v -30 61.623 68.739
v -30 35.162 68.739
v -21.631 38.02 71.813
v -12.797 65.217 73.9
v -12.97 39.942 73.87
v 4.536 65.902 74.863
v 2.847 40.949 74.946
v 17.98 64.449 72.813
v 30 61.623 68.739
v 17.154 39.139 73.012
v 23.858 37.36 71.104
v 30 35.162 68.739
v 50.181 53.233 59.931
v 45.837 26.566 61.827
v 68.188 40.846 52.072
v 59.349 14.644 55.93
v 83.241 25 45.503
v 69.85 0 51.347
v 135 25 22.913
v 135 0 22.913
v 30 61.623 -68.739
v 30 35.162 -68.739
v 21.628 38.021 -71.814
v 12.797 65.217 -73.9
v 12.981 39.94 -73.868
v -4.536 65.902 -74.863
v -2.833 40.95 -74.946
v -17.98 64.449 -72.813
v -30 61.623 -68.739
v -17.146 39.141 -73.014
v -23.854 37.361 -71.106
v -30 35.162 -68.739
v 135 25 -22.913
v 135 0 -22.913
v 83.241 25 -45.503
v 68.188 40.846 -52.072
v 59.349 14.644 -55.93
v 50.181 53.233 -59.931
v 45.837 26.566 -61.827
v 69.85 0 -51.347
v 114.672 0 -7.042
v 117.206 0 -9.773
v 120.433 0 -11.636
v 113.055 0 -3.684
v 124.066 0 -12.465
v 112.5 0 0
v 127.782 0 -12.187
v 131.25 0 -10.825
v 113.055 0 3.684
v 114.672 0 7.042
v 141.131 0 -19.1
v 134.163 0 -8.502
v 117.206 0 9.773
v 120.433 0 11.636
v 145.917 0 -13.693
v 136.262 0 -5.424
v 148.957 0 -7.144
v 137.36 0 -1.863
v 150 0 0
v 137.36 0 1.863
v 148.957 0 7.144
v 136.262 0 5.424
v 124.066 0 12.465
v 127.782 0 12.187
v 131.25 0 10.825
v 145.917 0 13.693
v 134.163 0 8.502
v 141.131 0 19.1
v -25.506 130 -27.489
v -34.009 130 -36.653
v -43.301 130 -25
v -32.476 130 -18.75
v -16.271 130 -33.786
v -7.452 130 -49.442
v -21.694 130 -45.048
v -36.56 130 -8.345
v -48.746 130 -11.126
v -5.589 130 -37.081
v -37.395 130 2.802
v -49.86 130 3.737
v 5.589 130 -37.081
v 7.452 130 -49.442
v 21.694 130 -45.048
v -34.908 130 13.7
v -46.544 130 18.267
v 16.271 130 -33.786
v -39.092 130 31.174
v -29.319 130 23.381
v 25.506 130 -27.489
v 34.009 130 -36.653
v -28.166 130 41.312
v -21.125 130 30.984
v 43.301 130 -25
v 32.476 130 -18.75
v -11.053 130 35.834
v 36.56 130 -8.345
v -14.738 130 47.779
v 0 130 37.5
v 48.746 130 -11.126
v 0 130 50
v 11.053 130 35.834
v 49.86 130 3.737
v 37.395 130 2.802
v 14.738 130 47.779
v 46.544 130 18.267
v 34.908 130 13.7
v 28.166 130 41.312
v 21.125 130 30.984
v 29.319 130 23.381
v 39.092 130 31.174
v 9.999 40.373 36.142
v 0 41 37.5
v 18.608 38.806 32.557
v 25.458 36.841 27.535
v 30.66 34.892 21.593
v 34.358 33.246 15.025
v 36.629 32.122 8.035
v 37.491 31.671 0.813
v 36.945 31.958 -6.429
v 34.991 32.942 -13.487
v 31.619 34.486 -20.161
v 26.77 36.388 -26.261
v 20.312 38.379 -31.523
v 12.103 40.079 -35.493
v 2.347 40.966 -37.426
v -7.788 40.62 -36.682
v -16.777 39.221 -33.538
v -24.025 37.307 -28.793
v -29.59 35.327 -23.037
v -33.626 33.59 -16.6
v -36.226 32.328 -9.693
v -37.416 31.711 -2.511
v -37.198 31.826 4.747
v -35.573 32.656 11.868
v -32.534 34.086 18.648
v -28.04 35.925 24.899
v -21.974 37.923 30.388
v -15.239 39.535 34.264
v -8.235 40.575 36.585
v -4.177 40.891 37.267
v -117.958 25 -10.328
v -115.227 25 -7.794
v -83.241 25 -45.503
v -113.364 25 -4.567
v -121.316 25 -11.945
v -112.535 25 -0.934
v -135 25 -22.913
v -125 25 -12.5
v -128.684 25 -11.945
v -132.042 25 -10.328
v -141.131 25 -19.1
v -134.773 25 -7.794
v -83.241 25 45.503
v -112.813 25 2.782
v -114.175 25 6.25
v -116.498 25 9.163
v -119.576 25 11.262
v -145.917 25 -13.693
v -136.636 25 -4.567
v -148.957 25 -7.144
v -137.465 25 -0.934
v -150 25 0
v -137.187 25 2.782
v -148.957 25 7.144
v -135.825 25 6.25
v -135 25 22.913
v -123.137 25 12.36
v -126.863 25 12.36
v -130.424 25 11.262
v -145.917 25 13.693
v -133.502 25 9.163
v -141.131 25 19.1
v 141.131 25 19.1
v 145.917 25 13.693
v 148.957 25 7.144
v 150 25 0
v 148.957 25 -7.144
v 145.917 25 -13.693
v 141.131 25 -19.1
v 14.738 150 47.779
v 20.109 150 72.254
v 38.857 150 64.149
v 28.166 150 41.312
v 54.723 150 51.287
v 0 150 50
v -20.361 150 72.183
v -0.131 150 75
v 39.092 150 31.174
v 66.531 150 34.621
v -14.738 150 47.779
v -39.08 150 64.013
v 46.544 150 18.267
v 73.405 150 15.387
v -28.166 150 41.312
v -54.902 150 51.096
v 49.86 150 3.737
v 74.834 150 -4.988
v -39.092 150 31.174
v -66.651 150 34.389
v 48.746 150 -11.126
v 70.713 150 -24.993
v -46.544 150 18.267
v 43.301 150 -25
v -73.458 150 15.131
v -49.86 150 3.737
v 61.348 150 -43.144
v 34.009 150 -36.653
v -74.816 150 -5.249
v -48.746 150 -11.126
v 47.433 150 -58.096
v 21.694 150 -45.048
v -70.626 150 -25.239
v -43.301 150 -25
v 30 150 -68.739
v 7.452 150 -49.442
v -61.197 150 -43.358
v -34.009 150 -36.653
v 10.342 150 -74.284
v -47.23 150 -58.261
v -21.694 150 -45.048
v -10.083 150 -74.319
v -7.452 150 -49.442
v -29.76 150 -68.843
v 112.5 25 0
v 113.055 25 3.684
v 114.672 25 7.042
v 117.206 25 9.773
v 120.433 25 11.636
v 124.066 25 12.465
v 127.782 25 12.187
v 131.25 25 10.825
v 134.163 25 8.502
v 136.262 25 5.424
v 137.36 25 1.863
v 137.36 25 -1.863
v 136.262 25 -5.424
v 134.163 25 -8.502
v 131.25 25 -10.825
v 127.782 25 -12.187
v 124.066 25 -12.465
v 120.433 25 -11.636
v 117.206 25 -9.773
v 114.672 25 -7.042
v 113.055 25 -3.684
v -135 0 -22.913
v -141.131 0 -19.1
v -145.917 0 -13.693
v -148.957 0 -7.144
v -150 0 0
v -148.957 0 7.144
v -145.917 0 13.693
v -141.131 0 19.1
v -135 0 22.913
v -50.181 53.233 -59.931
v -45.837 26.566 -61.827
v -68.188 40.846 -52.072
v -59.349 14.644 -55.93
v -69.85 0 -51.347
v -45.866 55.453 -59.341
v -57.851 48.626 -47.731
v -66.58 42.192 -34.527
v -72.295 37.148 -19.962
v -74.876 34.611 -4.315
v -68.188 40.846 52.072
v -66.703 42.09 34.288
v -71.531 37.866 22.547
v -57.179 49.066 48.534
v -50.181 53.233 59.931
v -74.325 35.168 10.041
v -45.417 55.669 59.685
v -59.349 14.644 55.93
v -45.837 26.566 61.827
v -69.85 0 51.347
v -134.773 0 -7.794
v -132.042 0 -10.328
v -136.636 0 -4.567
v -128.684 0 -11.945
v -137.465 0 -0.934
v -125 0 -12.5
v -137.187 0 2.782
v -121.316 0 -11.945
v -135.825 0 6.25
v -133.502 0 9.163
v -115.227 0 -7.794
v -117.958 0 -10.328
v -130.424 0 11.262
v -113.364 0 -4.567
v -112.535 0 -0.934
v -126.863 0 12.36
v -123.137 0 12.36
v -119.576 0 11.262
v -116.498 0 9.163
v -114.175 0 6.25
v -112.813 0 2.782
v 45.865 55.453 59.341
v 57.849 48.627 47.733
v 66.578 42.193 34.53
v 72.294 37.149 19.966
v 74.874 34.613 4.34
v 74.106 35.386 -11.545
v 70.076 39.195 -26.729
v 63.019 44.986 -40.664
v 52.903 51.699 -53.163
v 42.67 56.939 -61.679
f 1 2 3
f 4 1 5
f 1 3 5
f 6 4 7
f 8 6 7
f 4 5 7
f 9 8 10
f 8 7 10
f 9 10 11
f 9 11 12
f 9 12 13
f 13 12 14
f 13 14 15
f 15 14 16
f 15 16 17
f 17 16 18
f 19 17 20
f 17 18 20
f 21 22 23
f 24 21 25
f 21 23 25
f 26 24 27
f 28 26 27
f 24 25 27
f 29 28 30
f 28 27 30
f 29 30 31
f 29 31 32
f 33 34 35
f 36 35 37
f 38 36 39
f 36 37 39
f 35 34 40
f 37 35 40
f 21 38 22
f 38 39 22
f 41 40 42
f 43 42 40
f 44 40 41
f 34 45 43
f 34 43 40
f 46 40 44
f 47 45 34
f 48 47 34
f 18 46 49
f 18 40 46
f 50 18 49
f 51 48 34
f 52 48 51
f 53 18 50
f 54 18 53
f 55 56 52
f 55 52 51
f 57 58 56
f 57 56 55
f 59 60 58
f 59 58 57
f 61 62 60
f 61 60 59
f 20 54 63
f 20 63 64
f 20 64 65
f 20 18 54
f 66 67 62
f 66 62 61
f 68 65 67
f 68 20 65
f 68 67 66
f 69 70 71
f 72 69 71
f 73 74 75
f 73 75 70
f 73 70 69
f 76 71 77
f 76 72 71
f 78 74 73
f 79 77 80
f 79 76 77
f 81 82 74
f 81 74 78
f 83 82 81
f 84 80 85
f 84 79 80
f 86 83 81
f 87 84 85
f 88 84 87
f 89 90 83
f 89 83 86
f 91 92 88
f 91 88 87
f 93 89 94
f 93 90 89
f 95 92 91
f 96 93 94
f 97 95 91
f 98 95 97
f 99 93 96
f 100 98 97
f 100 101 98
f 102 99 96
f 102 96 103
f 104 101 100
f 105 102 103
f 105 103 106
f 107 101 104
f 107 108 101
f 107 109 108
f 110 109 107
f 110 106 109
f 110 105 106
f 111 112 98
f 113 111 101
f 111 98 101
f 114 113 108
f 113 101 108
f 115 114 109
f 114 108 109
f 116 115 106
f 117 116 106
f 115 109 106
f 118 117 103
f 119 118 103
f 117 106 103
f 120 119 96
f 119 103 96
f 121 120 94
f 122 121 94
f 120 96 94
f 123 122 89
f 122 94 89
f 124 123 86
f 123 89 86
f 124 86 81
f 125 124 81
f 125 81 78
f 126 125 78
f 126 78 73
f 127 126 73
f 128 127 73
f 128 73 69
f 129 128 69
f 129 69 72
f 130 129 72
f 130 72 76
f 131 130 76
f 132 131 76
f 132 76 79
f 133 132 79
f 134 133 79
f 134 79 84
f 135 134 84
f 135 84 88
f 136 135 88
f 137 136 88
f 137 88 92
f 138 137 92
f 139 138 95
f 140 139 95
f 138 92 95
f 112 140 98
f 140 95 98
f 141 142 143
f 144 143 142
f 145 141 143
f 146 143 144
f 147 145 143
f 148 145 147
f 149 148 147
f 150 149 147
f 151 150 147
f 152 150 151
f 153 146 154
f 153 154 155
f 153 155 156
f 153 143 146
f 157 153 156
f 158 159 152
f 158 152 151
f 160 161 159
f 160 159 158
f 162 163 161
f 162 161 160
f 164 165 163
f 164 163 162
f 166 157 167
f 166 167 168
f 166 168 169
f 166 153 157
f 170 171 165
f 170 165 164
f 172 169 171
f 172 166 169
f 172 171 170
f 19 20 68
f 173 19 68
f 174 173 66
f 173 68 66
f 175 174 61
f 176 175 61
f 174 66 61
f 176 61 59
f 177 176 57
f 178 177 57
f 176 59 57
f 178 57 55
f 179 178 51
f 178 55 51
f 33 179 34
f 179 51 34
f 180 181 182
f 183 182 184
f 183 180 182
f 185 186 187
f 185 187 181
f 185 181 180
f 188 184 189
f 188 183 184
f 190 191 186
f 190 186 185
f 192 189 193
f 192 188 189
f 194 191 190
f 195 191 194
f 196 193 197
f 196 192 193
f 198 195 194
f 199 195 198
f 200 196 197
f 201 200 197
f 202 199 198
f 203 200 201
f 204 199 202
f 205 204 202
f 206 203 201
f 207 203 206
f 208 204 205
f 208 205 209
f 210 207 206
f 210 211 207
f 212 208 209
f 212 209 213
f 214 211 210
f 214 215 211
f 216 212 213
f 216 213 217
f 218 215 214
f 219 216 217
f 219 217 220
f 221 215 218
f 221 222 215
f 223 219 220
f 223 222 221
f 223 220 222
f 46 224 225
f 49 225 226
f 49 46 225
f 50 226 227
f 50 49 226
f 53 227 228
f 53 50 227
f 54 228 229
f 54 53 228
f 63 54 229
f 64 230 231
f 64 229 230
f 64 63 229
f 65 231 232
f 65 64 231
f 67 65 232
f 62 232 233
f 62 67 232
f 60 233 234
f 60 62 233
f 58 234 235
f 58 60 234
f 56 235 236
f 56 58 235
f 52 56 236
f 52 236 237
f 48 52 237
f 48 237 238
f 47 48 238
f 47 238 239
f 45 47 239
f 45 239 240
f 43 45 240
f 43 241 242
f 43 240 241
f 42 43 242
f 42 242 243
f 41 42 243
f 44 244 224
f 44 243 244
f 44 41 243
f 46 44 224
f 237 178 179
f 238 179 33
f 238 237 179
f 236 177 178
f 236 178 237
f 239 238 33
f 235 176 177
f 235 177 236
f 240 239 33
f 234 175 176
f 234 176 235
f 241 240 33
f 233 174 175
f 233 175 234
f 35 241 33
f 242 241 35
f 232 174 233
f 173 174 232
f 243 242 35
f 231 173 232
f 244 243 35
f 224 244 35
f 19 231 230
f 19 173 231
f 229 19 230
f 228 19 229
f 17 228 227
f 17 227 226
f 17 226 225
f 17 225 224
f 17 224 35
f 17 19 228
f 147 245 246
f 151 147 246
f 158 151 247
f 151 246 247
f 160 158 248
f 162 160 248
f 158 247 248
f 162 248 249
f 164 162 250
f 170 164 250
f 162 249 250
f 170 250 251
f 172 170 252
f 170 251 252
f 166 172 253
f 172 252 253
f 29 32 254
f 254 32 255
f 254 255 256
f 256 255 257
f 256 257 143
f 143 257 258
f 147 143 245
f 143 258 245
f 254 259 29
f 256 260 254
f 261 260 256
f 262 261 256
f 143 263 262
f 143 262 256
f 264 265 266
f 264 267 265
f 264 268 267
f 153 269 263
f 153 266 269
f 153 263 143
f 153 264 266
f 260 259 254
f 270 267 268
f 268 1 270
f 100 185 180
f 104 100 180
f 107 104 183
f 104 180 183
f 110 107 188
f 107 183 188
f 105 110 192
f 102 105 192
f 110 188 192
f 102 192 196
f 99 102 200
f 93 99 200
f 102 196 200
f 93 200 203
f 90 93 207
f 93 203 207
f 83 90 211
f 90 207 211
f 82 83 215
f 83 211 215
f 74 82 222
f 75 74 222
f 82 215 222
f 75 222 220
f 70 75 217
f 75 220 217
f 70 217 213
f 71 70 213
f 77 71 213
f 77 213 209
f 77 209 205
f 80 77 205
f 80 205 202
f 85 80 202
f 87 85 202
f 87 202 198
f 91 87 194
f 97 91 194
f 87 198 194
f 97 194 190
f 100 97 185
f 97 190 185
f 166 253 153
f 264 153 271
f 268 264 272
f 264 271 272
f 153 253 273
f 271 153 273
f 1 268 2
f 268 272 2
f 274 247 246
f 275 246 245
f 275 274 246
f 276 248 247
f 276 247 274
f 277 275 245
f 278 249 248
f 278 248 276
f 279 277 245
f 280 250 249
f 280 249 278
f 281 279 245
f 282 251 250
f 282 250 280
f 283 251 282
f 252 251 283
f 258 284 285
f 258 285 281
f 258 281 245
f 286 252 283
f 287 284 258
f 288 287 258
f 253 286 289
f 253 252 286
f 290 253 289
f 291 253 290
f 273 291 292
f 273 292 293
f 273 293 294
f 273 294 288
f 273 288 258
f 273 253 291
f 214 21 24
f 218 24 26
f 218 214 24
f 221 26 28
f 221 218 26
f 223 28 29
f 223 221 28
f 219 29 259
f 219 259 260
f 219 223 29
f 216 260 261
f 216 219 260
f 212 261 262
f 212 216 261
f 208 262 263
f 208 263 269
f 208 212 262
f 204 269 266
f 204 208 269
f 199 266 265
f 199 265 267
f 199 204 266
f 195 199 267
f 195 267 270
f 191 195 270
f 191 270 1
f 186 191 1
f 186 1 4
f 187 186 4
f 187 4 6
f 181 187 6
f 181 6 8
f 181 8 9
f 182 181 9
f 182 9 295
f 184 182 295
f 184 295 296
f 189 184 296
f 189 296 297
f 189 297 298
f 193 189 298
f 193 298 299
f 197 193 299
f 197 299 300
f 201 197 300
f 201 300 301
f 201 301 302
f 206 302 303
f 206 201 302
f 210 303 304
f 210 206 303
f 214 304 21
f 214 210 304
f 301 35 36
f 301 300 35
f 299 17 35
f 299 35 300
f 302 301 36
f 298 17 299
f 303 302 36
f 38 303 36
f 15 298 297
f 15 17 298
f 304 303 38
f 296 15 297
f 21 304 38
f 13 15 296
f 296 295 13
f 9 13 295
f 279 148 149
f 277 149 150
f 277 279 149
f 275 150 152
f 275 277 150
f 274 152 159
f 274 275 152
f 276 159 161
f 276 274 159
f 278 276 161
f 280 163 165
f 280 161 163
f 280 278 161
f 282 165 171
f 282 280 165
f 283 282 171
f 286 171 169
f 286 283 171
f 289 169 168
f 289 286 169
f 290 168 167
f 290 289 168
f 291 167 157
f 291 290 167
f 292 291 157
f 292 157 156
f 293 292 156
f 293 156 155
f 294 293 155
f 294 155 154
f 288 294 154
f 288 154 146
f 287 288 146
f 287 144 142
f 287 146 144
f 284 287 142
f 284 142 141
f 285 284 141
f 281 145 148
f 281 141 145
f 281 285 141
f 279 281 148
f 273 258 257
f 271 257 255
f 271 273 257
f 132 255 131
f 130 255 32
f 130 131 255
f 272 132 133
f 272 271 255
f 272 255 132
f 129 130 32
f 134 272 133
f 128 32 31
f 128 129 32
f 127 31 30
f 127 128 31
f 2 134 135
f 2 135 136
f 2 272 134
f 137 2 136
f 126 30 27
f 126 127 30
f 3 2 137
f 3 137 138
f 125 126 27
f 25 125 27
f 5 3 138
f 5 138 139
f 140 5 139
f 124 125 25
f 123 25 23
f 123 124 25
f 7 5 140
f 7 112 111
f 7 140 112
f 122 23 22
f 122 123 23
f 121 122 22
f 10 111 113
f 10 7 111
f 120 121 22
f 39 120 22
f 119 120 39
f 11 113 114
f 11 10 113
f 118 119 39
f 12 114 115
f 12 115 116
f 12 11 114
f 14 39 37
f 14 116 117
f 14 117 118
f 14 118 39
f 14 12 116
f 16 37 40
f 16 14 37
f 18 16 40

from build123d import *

# Parameters (mm, degrees)
BOSS_EXTRUDE3_DEPTH = 75
SKETCH2_OUTSIDE_W   = 370.368
SKETCH2_OUTSIDE_H   = 220.368
SKETCH2_OUTSIDE_R   = 12.5
CUT_EXTRUDE1_DEPTH  = 150
BOSS_EXTRUDE4_REACH = 227
SKETCH3_R           = 75
SKETCH4_R           = 37.5
CUT_EXTRUDE2_DEPTH  = 150
SKETCH4_4_R         = 50
SKETCH4_4_R_2       = 37.5
CUT_EXTRUDE3_DEPTH  = 20


with BuildPart() as part:
    # Sketch1 → Boss-Extrude3 (new, symmetric)
    with BuildSketch(Plane.XY):
        with BuildLine():
            Line((-150, 25), (-150, 0))
            Line((-150, 0), (-69.84983894, 0))
            ThreePointArc((-69.84983894, 0), (0, 41), (69.84983894, 0))
            Line((69.84983894, 0), (150, 0))
            Line((150, 0), (150, 25))
            Line((150, 25), (83.240615087, 25))
            ThreePointArc((83.240615087, 25), (0, 66), (-83.240615087, 25))
            Line((-83.240615087, 25), (-150, 25))
        make_face()
    extrude(amount=BOSS_EXTRUDE3_DEPTH, both=True)

    # Sketch2 outside → Cut-Extrude1 (cut)
    # profile 1 of 3: a face of its own
    with BuildSketch(Plane(origin=(0, 0, 0), x_dir=(1, 0, 0), z_dir=(0, 1, 0))):
        Rectangle(SKETCH2_OUTSIDE_W, SKETCH2_OUTSIDE_H)
        with BuildLine():
            Line((-135, -22.912878475), (-30, -68.738635424))
            ThreePointArc((-30, -68.738635424), (0, -75), (30, -68.738635424))
            Line((30, -68.738635424), (135, -22.912878475))
            ThreePointArc((135, -22.912878475), (150, 0), (135, 22.912878475))
            Line((135, 22.912878475), (30, 68.738635424))
            ThreePointArc((30, 68.738635424), (0, 75), (-30, 68.738635424))
            Line((-30, 68.738635424), (-135, 22.912878475))
            ThreePointArc((-135, 22.912878475), (-150, 0), (-135, -22.912878475))
        make_face(mode=Mode.SUBTRACT)
    # profile 2 of 3: a face of its own
    with BuildSketch(Plane(origin=(0, 0, 0), x_dir=(1, 0, 0), z_dir=(0, 1, 0))):
        with Locations((125, 0)):
            Circle(SKETCH2_OUTSIDE_R)
    # profile 3 of 3: a face of its own
    with BuildSketch(Plane(origin=(0, 0, 0), x_dir=(1, 0, 0), z_dir=(0, 1, 0))):
        with Locations((-125, 0)):
            Circle(SKETCH2_OUTSIDE_R)
    extrude(amount=CUT_EXTRUDE1_DEPTH, mode=Mode.SUBTRACT)

    # Sketch3 → Boss-Extrude4 (add, up to next)
    with BuildSketch(Plane(origin=(0, 150, 0), x_dir=(1, 0, 0), z_dir=(0, 1, 0)), mode=Mode.PRIVATE) as boss_extrude4_sk1:
        Circle(SKETCH3_R)
    boss_extrude4_tool1 = extrude(boss_extrude4_sk1.sketch, amount=-BOSS_EXTRUDE4_REACH, mode=Mode.PRIVATE) - part.part
    add(boss_extrude4_tool1.solids().sort_by_distance((0, 150, 0))[0])

    # Sketch4 → Cut-Extrude2 (cut)
    with BuildSketch(Plane(origin=(0, 150, 0), x_dir=(1, 0, 0), z_dir=(0, 1, 0))):
        Circle(SKETCH4_R)
    extrude(amount=-CUT_EXTRUDE2_DEPTH, mode=Mode.SUBTRACT)

    # Sketch4<4> → Cut-Extrude3 (cut)
    with BuildSketch(Plane(origin=(0, 150, 0), x_dir=(1, 0, 0), z_dir=(0, 1, 0))):
        Circle(SKETCH4_4_R)
        Circle(SKETCH4_4_R_2, mode=Mode.SUBTRACT)
    extrude(amount=-CUT_EXTRUDE3_DEPTH, mode=Mode.SUBTRACT)


solid = part.part
